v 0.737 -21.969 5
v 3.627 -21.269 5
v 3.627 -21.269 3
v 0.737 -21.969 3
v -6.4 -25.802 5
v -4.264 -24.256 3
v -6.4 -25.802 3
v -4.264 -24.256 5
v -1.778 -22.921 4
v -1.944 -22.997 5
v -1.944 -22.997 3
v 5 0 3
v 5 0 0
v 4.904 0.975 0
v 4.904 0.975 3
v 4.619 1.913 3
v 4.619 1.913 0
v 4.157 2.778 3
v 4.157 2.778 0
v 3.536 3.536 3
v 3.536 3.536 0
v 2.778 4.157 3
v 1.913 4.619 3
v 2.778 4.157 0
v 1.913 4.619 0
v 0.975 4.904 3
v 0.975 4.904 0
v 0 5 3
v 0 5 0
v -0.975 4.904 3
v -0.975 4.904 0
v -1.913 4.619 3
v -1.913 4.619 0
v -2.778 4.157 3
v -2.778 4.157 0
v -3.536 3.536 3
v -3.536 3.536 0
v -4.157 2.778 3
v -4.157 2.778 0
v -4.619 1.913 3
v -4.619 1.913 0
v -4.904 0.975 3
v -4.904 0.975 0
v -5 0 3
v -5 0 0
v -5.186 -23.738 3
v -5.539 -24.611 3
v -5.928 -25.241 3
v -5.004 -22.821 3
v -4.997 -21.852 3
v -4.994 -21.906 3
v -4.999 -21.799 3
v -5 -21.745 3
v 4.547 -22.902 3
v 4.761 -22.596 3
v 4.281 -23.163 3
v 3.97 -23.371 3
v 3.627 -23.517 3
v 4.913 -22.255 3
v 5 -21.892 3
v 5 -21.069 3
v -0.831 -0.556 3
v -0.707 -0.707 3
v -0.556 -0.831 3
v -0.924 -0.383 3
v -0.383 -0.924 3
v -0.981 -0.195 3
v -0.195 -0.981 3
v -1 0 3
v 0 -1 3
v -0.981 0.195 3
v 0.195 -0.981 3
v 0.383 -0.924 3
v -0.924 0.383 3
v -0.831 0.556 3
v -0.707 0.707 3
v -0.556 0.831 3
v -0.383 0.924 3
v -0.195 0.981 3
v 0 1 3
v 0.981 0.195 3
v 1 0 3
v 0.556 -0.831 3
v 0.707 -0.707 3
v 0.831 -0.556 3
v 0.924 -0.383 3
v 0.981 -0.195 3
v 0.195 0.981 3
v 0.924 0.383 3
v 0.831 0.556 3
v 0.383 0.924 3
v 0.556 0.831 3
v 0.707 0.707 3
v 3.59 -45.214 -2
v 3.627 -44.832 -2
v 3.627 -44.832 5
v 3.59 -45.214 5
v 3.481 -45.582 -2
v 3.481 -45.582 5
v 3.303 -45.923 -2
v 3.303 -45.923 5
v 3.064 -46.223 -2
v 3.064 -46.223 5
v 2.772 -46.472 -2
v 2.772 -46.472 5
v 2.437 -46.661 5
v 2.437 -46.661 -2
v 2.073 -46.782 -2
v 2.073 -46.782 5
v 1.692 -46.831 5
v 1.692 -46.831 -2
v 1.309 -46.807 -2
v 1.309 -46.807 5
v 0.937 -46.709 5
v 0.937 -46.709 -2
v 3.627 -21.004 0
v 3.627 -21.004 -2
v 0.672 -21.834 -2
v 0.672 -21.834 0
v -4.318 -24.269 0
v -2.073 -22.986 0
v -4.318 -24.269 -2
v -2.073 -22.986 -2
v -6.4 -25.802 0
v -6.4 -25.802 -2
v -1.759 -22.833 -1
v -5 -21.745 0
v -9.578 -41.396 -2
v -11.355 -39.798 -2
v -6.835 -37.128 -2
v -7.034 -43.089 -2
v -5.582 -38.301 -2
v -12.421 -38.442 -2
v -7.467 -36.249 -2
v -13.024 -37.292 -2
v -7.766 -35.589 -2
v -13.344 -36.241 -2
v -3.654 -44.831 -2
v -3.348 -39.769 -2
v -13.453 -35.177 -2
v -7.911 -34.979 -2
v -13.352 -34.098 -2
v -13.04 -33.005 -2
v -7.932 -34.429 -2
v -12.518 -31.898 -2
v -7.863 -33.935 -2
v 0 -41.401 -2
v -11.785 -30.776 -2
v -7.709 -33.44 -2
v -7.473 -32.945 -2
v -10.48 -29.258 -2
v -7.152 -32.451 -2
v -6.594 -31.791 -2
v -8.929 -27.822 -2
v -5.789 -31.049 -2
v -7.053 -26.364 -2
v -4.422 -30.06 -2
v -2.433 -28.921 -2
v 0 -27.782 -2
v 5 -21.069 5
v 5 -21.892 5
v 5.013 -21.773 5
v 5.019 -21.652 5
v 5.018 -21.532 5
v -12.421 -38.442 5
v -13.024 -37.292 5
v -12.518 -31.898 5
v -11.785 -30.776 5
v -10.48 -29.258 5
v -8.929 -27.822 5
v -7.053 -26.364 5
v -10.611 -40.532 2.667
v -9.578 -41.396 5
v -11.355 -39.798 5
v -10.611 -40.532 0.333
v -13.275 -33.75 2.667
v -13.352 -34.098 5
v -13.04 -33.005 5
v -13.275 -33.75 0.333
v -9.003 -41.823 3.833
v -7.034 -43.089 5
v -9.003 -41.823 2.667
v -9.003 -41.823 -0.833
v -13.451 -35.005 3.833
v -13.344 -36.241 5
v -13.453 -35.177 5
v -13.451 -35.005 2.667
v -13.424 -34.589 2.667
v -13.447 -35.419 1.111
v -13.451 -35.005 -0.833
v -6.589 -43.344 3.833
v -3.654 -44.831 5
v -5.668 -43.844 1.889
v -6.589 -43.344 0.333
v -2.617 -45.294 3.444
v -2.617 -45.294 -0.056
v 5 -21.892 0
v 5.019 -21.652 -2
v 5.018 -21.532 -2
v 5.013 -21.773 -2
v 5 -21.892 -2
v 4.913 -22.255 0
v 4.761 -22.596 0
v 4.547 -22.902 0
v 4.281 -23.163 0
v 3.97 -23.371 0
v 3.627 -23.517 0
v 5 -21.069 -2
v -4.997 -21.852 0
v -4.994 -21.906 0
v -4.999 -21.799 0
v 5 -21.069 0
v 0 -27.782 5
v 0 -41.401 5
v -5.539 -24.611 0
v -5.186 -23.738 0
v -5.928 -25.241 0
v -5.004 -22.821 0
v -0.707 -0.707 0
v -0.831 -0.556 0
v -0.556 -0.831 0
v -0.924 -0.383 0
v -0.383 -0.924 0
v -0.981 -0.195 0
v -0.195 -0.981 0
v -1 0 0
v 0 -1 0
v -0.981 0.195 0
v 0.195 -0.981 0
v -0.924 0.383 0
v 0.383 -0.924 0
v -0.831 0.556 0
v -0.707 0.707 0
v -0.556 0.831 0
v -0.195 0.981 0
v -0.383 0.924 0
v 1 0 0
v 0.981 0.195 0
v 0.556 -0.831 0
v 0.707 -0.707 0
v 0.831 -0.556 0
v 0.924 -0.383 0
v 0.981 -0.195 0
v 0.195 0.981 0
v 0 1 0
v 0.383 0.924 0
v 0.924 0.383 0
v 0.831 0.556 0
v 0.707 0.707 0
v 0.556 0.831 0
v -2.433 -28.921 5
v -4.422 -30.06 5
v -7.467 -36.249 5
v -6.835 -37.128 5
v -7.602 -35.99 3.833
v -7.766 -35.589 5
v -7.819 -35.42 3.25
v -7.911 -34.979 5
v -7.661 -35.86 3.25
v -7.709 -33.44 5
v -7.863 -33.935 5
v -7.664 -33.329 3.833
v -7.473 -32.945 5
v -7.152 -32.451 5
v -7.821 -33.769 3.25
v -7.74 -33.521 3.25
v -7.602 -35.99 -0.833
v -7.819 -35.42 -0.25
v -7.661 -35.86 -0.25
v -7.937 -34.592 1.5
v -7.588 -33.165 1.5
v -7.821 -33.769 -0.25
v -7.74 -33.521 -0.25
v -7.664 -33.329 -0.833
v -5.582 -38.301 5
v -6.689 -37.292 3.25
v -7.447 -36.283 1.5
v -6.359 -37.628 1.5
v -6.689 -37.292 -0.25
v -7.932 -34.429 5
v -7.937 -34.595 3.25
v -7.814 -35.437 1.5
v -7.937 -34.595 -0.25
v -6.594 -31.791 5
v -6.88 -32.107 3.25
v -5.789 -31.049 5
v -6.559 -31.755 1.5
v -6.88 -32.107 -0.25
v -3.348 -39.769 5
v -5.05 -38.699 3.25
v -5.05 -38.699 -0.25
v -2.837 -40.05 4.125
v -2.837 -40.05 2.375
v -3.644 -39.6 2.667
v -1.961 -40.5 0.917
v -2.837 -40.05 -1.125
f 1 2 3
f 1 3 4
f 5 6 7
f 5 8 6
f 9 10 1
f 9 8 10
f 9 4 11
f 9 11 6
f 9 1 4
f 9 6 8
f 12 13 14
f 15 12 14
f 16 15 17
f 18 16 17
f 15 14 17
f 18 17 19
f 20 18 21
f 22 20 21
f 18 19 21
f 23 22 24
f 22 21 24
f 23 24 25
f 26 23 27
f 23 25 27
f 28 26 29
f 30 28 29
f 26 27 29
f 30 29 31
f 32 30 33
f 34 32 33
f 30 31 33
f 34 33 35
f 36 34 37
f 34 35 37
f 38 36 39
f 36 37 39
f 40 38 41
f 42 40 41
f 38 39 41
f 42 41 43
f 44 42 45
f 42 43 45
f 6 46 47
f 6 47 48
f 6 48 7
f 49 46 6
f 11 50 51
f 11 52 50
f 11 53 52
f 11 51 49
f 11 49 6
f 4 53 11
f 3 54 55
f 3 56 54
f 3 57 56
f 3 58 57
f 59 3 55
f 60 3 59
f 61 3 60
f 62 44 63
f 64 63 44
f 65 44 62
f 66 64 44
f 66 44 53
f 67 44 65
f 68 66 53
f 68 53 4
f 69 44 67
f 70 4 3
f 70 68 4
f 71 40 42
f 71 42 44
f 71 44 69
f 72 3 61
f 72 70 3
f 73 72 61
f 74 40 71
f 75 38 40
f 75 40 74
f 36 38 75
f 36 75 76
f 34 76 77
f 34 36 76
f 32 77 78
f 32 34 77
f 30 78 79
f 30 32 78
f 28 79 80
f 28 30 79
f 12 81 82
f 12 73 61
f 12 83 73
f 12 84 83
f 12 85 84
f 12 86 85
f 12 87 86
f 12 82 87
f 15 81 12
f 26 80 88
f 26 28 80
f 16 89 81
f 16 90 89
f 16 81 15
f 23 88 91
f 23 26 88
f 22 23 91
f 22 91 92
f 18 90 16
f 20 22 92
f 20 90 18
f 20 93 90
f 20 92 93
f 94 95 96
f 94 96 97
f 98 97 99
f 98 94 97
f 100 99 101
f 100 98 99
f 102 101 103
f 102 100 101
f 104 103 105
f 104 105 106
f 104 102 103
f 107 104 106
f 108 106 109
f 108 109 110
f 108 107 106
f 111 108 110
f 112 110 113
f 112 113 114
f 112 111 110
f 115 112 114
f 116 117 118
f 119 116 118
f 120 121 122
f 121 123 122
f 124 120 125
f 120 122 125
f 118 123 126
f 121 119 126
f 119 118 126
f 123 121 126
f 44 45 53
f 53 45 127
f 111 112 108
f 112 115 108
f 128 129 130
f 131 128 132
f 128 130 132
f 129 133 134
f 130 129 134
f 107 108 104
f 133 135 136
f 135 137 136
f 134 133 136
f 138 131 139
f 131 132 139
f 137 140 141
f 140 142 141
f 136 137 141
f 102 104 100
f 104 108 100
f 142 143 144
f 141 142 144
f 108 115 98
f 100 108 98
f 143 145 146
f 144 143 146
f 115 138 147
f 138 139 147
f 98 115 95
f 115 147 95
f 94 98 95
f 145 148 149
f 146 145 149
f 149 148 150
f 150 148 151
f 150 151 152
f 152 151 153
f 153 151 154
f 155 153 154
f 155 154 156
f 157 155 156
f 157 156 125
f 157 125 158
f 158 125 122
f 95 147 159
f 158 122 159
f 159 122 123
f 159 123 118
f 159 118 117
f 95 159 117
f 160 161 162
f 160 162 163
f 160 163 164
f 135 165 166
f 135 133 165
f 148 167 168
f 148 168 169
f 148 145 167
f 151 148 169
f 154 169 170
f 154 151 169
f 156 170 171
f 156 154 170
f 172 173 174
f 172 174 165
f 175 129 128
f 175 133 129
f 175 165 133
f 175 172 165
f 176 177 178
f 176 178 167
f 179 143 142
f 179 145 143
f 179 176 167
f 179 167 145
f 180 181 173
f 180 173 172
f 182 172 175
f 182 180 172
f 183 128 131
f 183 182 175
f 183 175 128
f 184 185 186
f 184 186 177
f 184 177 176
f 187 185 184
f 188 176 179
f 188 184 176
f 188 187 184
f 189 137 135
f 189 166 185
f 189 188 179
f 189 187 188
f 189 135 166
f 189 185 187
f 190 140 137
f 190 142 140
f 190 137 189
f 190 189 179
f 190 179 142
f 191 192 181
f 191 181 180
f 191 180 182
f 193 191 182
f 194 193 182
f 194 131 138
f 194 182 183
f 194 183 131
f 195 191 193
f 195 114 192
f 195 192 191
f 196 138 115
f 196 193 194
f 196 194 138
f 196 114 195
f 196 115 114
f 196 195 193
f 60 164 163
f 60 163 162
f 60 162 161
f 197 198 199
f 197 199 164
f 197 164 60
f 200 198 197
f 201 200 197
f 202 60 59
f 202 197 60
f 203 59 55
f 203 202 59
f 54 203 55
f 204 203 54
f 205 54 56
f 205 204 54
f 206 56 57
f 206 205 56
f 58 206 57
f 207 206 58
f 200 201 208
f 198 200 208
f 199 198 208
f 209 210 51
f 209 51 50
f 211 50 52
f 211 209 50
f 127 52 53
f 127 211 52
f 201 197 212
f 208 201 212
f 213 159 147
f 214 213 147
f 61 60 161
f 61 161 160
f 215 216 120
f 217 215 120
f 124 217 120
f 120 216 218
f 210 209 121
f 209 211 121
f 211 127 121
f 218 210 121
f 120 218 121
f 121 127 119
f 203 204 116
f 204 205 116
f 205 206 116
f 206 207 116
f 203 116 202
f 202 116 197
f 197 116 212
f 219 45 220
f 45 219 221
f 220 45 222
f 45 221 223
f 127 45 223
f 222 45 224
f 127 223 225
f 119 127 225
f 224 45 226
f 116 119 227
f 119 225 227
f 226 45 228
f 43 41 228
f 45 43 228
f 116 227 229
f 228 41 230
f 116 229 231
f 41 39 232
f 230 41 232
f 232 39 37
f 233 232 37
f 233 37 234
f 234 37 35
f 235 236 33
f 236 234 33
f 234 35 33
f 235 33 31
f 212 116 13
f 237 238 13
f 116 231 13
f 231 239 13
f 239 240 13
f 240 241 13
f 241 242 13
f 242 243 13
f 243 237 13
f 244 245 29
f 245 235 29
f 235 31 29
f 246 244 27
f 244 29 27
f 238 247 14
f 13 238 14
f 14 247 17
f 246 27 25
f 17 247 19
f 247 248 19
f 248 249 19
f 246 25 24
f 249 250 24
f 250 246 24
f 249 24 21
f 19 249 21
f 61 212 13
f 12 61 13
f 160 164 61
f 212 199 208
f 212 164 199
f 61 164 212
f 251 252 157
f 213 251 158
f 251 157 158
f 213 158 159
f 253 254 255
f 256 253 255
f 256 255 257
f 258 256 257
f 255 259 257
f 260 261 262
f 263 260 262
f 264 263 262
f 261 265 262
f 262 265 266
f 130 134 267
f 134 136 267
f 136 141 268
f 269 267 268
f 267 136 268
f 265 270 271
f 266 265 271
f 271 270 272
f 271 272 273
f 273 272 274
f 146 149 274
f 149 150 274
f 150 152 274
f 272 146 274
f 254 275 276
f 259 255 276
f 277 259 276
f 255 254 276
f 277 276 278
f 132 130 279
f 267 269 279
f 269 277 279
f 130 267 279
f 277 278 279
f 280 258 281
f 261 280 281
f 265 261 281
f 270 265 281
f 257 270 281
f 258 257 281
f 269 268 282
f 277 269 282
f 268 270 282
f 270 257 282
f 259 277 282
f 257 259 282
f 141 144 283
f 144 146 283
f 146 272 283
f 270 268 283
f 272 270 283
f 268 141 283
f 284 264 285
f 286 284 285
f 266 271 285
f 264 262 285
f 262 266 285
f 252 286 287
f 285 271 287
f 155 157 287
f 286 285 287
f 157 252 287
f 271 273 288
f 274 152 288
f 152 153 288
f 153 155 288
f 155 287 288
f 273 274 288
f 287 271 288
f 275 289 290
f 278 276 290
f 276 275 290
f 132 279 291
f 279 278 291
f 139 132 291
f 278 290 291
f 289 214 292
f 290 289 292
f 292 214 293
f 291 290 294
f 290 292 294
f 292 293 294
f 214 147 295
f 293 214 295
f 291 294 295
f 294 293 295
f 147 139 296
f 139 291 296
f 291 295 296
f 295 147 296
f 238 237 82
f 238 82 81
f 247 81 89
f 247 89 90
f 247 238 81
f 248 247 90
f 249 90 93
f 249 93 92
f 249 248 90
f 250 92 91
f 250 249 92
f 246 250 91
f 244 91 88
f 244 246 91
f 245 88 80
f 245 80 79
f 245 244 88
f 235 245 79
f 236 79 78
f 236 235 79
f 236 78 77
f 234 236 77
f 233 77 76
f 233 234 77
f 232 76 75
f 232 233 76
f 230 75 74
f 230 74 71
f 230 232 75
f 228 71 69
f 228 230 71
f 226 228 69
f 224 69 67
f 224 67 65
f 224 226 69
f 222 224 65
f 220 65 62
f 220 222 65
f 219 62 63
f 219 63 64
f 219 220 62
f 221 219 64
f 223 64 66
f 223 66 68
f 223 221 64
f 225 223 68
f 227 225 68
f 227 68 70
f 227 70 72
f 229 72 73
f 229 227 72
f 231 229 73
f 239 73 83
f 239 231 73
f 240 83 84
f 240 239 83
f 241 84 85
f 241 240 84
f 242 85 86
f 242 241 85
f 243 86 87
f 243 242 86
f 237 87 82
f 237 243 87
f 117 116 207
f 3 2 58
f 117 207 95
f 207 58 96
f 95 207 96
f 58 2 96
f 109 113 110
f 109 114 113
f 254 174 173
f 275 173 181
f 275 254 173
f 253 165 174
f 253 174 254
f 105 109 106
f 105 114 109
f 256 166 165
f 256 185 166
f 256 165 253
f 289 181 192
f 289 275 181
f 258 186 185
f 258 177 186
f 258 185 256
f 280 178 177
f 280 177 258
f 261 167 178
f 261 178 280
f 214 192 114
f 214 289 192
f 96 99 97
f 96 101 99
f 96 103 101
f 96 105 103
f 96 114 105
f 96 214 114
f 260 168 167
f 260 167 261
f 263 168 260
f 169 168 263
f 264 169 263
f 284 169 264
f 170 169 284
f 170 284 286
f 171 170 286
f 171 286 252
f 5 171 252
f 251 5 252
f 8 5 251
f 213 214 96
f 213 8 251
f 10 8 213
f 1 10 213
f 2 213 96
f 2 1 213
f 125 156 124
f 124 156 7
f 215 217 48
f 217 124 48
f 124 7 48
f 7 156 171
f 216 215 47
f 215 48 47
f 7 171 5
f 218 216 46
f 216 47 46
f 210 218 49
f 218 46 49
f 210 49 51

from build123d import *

# Parameters (mm, degrees)
SKETCH_1_R           = 1
EXTRUDE_1_DEPTH      = 3
EXTRUDE_2_DEPTH      = 2
EXTRUDE_2_DEPTH_BACK = 5
FILLET_START         = -3
FILLET_3_DEPTH       = 9
FILLET_4_R           = 5
CUT_EXTRUDE_2_DEPTH  = 2
CUT_EXTRUDE_3_DEPTH  = 2


with BuildPart() as part:
    # 草图1 → 凸台-拉伸1 (new body)
    with BuildSketch(Plane.XY):
        with BuildLine():
            Line((-5, 0), (-5, -18.11131196))
            Line((-5, -18.11131196), (5, -18.11131196))
            Line((5, -18.11131196), (5, 0))
            ThreePointArc((5, 0), (0, 5), (-5, 0))
        make_face()
        Circle(SKETCH_1_R, mode=Mode.SUBTRACT)
    extrude(amount=EXTRUDE_1_DEPTH)

    # 草图2 → 凸台-拉伸2 (add, two sides: drawn at the far end of the back side and taken through both)
    with BuildSketch(Plane.XY.offset(3).offset(-EXTRUDE_2_DEPTH_BACK)):
        with BuildLine():
            Line((5, -21.0685844), (5, -18.11131196))
            Line((5, -18.11131196), (-5, -18.11131196))
            Line((-5, -18.11131196), (-5, -21.0685844))
            Line((-5, -21.0685844), (-5, -23.814982117))
            Line((-5, -23.814982117), (-2.964275547, -23.744594918))
            add(Edge.make_bspline(
                [(3.626985758, -47.647589684), (-16.682654634, -40.9110727), (-18.879741736, -32.943407778), (-2.964275547, -23.744594918)],
                knots=[0, 0, 0, 0, 0.912623114, 0.912623114, 0.912623114, 0.912623114], degree=3))
            Line((3.626985758, -47.647589684), (3.626985758, -23.516695498))
            Line((3.626985758, -23.516695498), (5.09467917, -23.465948537))
            Line((5.09467917, -23.465948537), (5, -21.0685844))
        make_face()
        with BuildLine():
            add(Edge.make_bspline(
                [(0, -41.401376639), (-15.873118036, -34.591902926), (0, -27.782429212)],
                knots=[0, 0, 0, 1, 1, 1], degree=2))
            Line((0, -27.782429212), (0, -41.401376639))
        make_face(mode=Mode.SUBTRACT)
    extrude(amount=EXTRUDE_2_DEPTH + EXTRUDE_2_DEPTH_BACK)

    # 圆角3: read off the stored shape, not the designer's step
    # 圆角3 outline → 圆角3 (cut)
    with BuildSketch(Plane.XY.offset(FILLET_START)):
        with BuildLine():
            Line((5.09467917, -23.465948537), (5.018307469, -21.532146448))
            ThreePointArc((5.018307469, -21.532146448), (4.657500154, -22.759179091), (3.626985758, -23.516695498))
            Line((3.626985758, -23.516695498), (5.09467917, -23.465948537))
        make_face()
        with BuildLine():
            Line((-5, -23.814982117), (-2.964275547, -23.744594918))
            ThreePointArc((-2.964275547, -23.744594918), (-4.401526149, -23.171702163), (-5, -21.744914003))
            Line((-5, -21.744914003), (-5, -23.814982117))
        make_face()
        with BuildLine():
            Line((3.626985758, -47.647589684), (3.626985758, -44.832103607))
            ThreePointArc((3.626985758, -44.832103607), (2.771627596, -46.472163076), (0.937190695, -46.709384292))
            add(Edge.make_bspline(
                [(3.626985758, -47.647589684), (2.692000341, -47.337463802), (1.795401987, -47.024728671), (0.937190695, -46.709384292)],
                knots=[0, 0, 0, 0, 0.042014004, 0.042014004, 0.042014004, 0.042014004], degree=3))
        make_face()
    extrude(amount=FILLET_3_DEPTH, mode=Mode.SUBTRACT)

    # 圆角4
    fillet_4_edges = [part.edges().sort_by_distance(p)[0] for p in [
        (-2.964275547, -23.744594918, 0.5),
    ]]
    fillet(fillet_4_edges, radius=FILLET_4_R)

    # 草图6 → 切除-拉伸2 (cut)
    with BuildSketch(Plane.XY.offset(5)):
        with BuildLine():
            Line((3.626985758, -21.269208488), (3.626985758, -25.801560292))
            Line((3.626985758, -25.801560292), (5, -25.801560292))
            Line((5, -25.801560292), (5, -18.11131196))
            Line((5, -18.11131196), (-5, -18.11131196))
            Line((-5, -18.11131196), (-5, -21.269208488))
            Line((-5, -21.269208488), (-7.053376084, -26.364298767))
            add(Edge.make_bspline(
                [(3.626985758, -21.269208488), (-2.623871875, -22.388888024), (-7.053376084, -26.364298767)],
                knots=[0, 0, 0, 1, 1, 1], degree=2))
        make_face()
    extrude(amount=-CUT_EXTRUDE_2_DEPTH, mode=Mode.SUBTRACT)

    # 草图7 → 切除-拉伸3 (cut)
    with BuildSketch(Plane(origin=(0, 0, -2), x_dir=(-1, 0, 0), z_dir=(0, 0, -1))):
        with BuildLine():
            Line((-3.626985758, -21.004340975), (-3.626985758, -25.801560292))
            Line((-3.626985758, -25.801560292), (-5, -25.801560292))
            Line((-5, -25.801560292), (-5, -18.11131196))
            Line((-5, -18.11131196), (7.053376084, -18.11131196))
            Line((7.053376084, -18.11131196), (7.053376084, -26.364298767))
            add(Edge.make_bspline(
                [(-3.626985758, -21.004340975), (2.577596391, -22.360926345), (7.053376084, -26.364298767)],
                knots=[0, 0, 0, 1, 1, 1], degree=2))
        make_face()
    extrude(amount=-CUT_EXTRUDE_3_DEPTH, mode=Mode.SUBTRACT)


solid = part.part
